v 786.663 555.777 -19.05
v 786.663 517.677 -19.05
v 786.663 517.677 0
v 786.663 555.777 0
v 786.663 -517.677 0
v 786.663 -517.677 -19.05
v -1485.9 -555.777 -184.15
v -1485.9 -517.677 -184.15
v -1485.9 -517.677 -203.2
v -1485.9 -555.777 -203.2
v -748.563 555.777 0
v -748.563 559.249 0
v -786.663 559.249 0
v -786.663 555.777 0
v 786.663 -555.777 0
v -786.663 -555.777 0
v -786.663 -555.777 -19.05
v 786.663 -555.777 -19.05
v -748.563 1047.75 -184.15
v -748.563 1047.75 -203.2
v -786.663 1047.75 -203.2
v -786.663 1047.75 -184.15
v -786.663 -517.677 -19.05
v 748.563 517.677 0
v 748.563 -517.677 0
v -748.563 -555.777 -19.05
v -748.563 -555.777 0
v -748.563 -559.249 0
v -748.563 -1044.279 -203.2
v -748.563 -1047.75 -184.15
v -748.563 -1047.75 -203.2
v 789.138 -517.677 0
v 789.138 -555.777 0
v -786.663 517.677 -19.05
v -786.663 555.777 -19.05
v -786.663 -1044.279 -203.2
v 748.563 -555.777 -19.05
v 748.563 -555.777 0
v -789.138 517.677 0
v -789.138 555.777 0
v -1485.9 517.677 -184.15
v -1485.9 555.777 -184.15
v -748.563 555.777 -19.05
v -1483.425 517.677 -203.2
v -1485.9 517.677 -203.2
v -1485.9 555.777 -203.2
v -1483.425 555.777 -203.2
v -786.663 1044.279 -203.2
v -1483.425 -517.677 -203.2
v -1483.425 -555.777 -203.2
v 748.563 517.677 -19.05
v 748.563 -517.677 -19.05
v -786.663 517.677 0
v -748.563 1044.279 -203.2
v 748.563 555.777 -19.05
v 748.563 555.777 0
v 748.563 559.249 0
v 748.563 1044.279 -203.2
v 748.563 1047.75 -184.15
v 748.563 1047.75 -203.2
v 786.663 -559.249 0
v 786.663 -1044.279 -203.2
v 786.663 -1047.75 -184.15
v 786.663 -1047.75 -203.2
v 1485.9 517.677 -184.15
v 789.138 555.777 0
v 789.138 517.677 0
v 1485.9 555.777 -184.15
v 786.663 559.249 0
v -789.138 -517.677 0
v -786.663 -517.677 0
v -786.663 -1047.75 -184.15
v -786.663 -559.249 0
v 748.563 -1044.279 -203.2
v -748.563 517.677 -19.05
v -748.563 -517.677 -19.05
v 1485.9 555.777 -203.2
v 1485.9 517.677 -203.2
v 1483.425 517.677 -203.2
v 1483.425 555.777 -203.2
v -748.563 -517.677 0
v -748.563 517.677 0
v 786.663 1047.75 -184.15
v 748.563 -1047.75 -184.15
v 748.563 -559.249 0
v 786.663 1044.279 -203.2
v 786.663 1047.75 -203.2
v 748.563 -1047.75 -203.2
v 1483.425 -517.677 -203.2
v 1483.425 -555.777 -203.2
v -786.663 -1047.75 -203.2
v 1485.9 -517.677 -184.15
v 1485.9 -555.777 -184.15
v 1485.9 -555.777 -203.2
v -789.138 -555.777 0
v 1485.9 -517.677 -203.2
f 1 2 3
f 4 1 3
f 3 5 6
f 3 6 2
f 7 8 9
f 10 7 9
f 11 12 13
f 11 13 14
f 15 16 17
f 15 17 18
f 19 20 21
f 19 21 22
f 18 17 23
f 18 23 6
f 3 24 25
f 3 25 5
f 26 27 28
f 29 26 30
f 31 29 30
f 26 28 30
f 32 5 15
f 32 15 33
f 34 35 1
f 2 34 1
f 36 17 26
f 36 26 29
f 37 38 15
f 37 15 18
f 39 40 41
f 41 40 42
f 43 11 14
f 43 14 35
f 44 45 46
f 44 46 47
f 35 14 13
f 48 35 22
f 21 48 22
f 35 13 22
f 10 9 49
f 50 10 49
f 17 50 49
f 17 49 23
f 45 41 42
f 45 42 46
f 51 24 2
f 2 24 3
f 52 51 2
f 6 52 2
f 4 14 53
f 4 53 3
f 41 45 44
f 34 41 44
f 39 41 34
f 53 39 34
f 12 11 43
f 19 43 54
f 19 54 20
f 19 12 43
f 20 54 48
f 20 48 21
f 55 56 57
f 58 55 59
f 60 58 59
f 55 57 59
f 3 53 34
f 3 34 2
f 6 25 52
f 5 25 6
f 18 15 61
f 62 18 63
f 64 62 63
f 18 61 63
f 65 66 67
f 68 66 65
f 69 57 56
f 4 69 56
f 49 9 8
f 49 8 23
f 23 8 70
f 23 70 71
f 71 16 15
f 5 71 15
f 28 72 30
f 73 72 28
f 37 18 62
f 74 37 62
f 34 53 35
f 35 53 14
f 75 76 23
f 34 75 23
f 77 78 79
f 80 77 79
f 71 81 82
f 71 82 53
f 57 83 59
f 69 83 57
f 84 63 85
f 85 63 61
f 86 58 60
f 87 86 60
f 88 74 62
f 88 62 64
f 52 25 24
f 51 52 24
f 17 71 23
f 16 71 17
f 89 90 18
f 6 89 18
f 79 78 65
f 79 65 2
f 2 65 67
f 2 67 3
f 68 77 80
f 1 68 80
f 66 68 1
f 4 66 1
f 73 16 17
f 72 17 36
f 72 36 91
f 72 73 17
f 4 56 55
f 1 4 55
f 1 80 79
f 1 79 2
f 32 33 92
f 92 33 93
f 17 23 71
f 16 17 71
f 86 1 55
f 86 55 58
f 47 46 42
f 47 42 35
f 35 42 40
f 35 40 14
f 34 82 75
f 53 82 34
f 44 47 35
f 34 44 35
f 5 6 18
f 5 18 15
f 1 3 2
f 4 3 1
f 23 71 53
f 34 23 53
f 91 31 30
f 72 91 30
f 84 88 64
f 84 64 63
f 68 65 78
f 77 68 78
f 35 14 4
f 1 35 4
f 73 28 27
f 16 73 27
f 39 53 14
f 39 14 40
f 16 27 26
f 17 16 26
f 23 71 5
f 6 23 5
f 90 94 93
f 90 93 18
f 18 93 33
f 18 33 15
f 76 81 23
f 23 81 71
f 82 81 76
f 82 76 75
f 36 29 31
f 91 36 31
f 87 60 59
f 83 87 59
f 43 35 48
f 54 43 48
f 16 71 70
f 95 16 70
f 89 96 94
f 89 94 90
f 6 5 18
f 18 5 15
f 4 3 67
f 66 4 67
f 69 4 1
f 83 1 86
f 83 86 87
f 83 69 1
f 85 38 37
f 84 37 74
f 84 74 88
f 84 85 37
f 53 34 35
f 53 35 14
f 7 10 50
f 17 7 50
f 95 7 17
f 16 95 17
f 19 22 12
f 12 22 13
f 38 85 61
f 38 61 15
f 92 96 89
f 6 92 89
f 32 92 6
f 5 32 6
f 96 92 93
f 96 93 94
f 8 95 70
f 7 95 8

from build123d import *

# Parameters (mm, degrees)
F0_W      = 1573.3268
F0_H      = 38.1
F1_DEPTH  = 19.05
F2_W      = 38.1
F2_H      = 1035.3548
F3_DEPTH  = 19.05
F7_DEPTH  = 38.1
F11_DEPTH = 38.1


with BuildPart() as f1:
    # F0 (on Top) → F1 (new body)
    with BuildSketch(Plane.XY):
        with Locations((0, 536.7274)):
            Rectangle(F0_W, F0_H)
    extrude(amount=-F1_DEPTH)


with BuildPart() as f3:
    # F2 (on Top) → F3 (new body)
    with BuildSketch(Plane.XY):
        with Locations((767.6134, 0)):
            Rectangle(F2_W, F2_H)
    extrude(amount=-F3_DEPTH)


with BuildPart() as f4_1:
    # F4: instance of F1
    add(f1.part.mirror(Plane.XZ))


with BuildPart() as f5_1:
    # F5: instance of F3
    add(f3.part.mirror(Plane.YZ))


with BuildPart() as f7:
    # F6 (on face) → F7 (new body)
    with BuildSketch(Plane.YZ.offset(786.6634)):
        Polygon((555.7774, 0), (555.7774, -19.05), (1044.278598, -203.2), (1047.75, -203.2), (1047.75, -184.15), (559.248802, 0), align=None)
    extrude(amount=-F7_DEPTH)


with BuildPart() as f8_1:
    # F8: instance of F7
    add(f7.part.mirror(Plane.YZ))


with BuildPart() as f9_1:
    # F9: instance of F8_1
    add(f8_1.part.mirror(Plane.XZ))


with BuildPart() as f9_2:
    # F9: instance of F7
    add(f7.part.mirror(Plane.XZ))


with BuildPart() as f11:
    # F10 (on face) → F11 (new body)
    with BuildSketch(Plane(origin=(0, 555.7774, 0), x_dir=(-1, 0, 0), z_dir=(0, 1, 0))):
        Polygon((-786.6634, 0), (-789.138312, 0), (-1485.9, -184.15), (-1485.9, -203.2), (-1483.425088, -203.2), (-786.6634, -19.05), align=None)
    extrude(amount=-F11_DEPTH)


with BuildPart() as f12_1:
    # F12: instance of F11
    add(f11.part.mirror(Plane.XZ))


with BuildPart() as f13_1:
    # F13: instance of F12_1
    add(f12_1.part.mirror(Plane.YZ))


with BuildPart() as f13_2:
    # F13: instance of F11
    add(f11.part.mirror(Plane.YZ))


solid = Compound([f1.part, f3.part, f4_1.part, f5_1.part, f7.part, f8_1.part, f9_1.part, f9_2.part, f11.part, f12_1.part, f13_1.part, f13_2.part])
